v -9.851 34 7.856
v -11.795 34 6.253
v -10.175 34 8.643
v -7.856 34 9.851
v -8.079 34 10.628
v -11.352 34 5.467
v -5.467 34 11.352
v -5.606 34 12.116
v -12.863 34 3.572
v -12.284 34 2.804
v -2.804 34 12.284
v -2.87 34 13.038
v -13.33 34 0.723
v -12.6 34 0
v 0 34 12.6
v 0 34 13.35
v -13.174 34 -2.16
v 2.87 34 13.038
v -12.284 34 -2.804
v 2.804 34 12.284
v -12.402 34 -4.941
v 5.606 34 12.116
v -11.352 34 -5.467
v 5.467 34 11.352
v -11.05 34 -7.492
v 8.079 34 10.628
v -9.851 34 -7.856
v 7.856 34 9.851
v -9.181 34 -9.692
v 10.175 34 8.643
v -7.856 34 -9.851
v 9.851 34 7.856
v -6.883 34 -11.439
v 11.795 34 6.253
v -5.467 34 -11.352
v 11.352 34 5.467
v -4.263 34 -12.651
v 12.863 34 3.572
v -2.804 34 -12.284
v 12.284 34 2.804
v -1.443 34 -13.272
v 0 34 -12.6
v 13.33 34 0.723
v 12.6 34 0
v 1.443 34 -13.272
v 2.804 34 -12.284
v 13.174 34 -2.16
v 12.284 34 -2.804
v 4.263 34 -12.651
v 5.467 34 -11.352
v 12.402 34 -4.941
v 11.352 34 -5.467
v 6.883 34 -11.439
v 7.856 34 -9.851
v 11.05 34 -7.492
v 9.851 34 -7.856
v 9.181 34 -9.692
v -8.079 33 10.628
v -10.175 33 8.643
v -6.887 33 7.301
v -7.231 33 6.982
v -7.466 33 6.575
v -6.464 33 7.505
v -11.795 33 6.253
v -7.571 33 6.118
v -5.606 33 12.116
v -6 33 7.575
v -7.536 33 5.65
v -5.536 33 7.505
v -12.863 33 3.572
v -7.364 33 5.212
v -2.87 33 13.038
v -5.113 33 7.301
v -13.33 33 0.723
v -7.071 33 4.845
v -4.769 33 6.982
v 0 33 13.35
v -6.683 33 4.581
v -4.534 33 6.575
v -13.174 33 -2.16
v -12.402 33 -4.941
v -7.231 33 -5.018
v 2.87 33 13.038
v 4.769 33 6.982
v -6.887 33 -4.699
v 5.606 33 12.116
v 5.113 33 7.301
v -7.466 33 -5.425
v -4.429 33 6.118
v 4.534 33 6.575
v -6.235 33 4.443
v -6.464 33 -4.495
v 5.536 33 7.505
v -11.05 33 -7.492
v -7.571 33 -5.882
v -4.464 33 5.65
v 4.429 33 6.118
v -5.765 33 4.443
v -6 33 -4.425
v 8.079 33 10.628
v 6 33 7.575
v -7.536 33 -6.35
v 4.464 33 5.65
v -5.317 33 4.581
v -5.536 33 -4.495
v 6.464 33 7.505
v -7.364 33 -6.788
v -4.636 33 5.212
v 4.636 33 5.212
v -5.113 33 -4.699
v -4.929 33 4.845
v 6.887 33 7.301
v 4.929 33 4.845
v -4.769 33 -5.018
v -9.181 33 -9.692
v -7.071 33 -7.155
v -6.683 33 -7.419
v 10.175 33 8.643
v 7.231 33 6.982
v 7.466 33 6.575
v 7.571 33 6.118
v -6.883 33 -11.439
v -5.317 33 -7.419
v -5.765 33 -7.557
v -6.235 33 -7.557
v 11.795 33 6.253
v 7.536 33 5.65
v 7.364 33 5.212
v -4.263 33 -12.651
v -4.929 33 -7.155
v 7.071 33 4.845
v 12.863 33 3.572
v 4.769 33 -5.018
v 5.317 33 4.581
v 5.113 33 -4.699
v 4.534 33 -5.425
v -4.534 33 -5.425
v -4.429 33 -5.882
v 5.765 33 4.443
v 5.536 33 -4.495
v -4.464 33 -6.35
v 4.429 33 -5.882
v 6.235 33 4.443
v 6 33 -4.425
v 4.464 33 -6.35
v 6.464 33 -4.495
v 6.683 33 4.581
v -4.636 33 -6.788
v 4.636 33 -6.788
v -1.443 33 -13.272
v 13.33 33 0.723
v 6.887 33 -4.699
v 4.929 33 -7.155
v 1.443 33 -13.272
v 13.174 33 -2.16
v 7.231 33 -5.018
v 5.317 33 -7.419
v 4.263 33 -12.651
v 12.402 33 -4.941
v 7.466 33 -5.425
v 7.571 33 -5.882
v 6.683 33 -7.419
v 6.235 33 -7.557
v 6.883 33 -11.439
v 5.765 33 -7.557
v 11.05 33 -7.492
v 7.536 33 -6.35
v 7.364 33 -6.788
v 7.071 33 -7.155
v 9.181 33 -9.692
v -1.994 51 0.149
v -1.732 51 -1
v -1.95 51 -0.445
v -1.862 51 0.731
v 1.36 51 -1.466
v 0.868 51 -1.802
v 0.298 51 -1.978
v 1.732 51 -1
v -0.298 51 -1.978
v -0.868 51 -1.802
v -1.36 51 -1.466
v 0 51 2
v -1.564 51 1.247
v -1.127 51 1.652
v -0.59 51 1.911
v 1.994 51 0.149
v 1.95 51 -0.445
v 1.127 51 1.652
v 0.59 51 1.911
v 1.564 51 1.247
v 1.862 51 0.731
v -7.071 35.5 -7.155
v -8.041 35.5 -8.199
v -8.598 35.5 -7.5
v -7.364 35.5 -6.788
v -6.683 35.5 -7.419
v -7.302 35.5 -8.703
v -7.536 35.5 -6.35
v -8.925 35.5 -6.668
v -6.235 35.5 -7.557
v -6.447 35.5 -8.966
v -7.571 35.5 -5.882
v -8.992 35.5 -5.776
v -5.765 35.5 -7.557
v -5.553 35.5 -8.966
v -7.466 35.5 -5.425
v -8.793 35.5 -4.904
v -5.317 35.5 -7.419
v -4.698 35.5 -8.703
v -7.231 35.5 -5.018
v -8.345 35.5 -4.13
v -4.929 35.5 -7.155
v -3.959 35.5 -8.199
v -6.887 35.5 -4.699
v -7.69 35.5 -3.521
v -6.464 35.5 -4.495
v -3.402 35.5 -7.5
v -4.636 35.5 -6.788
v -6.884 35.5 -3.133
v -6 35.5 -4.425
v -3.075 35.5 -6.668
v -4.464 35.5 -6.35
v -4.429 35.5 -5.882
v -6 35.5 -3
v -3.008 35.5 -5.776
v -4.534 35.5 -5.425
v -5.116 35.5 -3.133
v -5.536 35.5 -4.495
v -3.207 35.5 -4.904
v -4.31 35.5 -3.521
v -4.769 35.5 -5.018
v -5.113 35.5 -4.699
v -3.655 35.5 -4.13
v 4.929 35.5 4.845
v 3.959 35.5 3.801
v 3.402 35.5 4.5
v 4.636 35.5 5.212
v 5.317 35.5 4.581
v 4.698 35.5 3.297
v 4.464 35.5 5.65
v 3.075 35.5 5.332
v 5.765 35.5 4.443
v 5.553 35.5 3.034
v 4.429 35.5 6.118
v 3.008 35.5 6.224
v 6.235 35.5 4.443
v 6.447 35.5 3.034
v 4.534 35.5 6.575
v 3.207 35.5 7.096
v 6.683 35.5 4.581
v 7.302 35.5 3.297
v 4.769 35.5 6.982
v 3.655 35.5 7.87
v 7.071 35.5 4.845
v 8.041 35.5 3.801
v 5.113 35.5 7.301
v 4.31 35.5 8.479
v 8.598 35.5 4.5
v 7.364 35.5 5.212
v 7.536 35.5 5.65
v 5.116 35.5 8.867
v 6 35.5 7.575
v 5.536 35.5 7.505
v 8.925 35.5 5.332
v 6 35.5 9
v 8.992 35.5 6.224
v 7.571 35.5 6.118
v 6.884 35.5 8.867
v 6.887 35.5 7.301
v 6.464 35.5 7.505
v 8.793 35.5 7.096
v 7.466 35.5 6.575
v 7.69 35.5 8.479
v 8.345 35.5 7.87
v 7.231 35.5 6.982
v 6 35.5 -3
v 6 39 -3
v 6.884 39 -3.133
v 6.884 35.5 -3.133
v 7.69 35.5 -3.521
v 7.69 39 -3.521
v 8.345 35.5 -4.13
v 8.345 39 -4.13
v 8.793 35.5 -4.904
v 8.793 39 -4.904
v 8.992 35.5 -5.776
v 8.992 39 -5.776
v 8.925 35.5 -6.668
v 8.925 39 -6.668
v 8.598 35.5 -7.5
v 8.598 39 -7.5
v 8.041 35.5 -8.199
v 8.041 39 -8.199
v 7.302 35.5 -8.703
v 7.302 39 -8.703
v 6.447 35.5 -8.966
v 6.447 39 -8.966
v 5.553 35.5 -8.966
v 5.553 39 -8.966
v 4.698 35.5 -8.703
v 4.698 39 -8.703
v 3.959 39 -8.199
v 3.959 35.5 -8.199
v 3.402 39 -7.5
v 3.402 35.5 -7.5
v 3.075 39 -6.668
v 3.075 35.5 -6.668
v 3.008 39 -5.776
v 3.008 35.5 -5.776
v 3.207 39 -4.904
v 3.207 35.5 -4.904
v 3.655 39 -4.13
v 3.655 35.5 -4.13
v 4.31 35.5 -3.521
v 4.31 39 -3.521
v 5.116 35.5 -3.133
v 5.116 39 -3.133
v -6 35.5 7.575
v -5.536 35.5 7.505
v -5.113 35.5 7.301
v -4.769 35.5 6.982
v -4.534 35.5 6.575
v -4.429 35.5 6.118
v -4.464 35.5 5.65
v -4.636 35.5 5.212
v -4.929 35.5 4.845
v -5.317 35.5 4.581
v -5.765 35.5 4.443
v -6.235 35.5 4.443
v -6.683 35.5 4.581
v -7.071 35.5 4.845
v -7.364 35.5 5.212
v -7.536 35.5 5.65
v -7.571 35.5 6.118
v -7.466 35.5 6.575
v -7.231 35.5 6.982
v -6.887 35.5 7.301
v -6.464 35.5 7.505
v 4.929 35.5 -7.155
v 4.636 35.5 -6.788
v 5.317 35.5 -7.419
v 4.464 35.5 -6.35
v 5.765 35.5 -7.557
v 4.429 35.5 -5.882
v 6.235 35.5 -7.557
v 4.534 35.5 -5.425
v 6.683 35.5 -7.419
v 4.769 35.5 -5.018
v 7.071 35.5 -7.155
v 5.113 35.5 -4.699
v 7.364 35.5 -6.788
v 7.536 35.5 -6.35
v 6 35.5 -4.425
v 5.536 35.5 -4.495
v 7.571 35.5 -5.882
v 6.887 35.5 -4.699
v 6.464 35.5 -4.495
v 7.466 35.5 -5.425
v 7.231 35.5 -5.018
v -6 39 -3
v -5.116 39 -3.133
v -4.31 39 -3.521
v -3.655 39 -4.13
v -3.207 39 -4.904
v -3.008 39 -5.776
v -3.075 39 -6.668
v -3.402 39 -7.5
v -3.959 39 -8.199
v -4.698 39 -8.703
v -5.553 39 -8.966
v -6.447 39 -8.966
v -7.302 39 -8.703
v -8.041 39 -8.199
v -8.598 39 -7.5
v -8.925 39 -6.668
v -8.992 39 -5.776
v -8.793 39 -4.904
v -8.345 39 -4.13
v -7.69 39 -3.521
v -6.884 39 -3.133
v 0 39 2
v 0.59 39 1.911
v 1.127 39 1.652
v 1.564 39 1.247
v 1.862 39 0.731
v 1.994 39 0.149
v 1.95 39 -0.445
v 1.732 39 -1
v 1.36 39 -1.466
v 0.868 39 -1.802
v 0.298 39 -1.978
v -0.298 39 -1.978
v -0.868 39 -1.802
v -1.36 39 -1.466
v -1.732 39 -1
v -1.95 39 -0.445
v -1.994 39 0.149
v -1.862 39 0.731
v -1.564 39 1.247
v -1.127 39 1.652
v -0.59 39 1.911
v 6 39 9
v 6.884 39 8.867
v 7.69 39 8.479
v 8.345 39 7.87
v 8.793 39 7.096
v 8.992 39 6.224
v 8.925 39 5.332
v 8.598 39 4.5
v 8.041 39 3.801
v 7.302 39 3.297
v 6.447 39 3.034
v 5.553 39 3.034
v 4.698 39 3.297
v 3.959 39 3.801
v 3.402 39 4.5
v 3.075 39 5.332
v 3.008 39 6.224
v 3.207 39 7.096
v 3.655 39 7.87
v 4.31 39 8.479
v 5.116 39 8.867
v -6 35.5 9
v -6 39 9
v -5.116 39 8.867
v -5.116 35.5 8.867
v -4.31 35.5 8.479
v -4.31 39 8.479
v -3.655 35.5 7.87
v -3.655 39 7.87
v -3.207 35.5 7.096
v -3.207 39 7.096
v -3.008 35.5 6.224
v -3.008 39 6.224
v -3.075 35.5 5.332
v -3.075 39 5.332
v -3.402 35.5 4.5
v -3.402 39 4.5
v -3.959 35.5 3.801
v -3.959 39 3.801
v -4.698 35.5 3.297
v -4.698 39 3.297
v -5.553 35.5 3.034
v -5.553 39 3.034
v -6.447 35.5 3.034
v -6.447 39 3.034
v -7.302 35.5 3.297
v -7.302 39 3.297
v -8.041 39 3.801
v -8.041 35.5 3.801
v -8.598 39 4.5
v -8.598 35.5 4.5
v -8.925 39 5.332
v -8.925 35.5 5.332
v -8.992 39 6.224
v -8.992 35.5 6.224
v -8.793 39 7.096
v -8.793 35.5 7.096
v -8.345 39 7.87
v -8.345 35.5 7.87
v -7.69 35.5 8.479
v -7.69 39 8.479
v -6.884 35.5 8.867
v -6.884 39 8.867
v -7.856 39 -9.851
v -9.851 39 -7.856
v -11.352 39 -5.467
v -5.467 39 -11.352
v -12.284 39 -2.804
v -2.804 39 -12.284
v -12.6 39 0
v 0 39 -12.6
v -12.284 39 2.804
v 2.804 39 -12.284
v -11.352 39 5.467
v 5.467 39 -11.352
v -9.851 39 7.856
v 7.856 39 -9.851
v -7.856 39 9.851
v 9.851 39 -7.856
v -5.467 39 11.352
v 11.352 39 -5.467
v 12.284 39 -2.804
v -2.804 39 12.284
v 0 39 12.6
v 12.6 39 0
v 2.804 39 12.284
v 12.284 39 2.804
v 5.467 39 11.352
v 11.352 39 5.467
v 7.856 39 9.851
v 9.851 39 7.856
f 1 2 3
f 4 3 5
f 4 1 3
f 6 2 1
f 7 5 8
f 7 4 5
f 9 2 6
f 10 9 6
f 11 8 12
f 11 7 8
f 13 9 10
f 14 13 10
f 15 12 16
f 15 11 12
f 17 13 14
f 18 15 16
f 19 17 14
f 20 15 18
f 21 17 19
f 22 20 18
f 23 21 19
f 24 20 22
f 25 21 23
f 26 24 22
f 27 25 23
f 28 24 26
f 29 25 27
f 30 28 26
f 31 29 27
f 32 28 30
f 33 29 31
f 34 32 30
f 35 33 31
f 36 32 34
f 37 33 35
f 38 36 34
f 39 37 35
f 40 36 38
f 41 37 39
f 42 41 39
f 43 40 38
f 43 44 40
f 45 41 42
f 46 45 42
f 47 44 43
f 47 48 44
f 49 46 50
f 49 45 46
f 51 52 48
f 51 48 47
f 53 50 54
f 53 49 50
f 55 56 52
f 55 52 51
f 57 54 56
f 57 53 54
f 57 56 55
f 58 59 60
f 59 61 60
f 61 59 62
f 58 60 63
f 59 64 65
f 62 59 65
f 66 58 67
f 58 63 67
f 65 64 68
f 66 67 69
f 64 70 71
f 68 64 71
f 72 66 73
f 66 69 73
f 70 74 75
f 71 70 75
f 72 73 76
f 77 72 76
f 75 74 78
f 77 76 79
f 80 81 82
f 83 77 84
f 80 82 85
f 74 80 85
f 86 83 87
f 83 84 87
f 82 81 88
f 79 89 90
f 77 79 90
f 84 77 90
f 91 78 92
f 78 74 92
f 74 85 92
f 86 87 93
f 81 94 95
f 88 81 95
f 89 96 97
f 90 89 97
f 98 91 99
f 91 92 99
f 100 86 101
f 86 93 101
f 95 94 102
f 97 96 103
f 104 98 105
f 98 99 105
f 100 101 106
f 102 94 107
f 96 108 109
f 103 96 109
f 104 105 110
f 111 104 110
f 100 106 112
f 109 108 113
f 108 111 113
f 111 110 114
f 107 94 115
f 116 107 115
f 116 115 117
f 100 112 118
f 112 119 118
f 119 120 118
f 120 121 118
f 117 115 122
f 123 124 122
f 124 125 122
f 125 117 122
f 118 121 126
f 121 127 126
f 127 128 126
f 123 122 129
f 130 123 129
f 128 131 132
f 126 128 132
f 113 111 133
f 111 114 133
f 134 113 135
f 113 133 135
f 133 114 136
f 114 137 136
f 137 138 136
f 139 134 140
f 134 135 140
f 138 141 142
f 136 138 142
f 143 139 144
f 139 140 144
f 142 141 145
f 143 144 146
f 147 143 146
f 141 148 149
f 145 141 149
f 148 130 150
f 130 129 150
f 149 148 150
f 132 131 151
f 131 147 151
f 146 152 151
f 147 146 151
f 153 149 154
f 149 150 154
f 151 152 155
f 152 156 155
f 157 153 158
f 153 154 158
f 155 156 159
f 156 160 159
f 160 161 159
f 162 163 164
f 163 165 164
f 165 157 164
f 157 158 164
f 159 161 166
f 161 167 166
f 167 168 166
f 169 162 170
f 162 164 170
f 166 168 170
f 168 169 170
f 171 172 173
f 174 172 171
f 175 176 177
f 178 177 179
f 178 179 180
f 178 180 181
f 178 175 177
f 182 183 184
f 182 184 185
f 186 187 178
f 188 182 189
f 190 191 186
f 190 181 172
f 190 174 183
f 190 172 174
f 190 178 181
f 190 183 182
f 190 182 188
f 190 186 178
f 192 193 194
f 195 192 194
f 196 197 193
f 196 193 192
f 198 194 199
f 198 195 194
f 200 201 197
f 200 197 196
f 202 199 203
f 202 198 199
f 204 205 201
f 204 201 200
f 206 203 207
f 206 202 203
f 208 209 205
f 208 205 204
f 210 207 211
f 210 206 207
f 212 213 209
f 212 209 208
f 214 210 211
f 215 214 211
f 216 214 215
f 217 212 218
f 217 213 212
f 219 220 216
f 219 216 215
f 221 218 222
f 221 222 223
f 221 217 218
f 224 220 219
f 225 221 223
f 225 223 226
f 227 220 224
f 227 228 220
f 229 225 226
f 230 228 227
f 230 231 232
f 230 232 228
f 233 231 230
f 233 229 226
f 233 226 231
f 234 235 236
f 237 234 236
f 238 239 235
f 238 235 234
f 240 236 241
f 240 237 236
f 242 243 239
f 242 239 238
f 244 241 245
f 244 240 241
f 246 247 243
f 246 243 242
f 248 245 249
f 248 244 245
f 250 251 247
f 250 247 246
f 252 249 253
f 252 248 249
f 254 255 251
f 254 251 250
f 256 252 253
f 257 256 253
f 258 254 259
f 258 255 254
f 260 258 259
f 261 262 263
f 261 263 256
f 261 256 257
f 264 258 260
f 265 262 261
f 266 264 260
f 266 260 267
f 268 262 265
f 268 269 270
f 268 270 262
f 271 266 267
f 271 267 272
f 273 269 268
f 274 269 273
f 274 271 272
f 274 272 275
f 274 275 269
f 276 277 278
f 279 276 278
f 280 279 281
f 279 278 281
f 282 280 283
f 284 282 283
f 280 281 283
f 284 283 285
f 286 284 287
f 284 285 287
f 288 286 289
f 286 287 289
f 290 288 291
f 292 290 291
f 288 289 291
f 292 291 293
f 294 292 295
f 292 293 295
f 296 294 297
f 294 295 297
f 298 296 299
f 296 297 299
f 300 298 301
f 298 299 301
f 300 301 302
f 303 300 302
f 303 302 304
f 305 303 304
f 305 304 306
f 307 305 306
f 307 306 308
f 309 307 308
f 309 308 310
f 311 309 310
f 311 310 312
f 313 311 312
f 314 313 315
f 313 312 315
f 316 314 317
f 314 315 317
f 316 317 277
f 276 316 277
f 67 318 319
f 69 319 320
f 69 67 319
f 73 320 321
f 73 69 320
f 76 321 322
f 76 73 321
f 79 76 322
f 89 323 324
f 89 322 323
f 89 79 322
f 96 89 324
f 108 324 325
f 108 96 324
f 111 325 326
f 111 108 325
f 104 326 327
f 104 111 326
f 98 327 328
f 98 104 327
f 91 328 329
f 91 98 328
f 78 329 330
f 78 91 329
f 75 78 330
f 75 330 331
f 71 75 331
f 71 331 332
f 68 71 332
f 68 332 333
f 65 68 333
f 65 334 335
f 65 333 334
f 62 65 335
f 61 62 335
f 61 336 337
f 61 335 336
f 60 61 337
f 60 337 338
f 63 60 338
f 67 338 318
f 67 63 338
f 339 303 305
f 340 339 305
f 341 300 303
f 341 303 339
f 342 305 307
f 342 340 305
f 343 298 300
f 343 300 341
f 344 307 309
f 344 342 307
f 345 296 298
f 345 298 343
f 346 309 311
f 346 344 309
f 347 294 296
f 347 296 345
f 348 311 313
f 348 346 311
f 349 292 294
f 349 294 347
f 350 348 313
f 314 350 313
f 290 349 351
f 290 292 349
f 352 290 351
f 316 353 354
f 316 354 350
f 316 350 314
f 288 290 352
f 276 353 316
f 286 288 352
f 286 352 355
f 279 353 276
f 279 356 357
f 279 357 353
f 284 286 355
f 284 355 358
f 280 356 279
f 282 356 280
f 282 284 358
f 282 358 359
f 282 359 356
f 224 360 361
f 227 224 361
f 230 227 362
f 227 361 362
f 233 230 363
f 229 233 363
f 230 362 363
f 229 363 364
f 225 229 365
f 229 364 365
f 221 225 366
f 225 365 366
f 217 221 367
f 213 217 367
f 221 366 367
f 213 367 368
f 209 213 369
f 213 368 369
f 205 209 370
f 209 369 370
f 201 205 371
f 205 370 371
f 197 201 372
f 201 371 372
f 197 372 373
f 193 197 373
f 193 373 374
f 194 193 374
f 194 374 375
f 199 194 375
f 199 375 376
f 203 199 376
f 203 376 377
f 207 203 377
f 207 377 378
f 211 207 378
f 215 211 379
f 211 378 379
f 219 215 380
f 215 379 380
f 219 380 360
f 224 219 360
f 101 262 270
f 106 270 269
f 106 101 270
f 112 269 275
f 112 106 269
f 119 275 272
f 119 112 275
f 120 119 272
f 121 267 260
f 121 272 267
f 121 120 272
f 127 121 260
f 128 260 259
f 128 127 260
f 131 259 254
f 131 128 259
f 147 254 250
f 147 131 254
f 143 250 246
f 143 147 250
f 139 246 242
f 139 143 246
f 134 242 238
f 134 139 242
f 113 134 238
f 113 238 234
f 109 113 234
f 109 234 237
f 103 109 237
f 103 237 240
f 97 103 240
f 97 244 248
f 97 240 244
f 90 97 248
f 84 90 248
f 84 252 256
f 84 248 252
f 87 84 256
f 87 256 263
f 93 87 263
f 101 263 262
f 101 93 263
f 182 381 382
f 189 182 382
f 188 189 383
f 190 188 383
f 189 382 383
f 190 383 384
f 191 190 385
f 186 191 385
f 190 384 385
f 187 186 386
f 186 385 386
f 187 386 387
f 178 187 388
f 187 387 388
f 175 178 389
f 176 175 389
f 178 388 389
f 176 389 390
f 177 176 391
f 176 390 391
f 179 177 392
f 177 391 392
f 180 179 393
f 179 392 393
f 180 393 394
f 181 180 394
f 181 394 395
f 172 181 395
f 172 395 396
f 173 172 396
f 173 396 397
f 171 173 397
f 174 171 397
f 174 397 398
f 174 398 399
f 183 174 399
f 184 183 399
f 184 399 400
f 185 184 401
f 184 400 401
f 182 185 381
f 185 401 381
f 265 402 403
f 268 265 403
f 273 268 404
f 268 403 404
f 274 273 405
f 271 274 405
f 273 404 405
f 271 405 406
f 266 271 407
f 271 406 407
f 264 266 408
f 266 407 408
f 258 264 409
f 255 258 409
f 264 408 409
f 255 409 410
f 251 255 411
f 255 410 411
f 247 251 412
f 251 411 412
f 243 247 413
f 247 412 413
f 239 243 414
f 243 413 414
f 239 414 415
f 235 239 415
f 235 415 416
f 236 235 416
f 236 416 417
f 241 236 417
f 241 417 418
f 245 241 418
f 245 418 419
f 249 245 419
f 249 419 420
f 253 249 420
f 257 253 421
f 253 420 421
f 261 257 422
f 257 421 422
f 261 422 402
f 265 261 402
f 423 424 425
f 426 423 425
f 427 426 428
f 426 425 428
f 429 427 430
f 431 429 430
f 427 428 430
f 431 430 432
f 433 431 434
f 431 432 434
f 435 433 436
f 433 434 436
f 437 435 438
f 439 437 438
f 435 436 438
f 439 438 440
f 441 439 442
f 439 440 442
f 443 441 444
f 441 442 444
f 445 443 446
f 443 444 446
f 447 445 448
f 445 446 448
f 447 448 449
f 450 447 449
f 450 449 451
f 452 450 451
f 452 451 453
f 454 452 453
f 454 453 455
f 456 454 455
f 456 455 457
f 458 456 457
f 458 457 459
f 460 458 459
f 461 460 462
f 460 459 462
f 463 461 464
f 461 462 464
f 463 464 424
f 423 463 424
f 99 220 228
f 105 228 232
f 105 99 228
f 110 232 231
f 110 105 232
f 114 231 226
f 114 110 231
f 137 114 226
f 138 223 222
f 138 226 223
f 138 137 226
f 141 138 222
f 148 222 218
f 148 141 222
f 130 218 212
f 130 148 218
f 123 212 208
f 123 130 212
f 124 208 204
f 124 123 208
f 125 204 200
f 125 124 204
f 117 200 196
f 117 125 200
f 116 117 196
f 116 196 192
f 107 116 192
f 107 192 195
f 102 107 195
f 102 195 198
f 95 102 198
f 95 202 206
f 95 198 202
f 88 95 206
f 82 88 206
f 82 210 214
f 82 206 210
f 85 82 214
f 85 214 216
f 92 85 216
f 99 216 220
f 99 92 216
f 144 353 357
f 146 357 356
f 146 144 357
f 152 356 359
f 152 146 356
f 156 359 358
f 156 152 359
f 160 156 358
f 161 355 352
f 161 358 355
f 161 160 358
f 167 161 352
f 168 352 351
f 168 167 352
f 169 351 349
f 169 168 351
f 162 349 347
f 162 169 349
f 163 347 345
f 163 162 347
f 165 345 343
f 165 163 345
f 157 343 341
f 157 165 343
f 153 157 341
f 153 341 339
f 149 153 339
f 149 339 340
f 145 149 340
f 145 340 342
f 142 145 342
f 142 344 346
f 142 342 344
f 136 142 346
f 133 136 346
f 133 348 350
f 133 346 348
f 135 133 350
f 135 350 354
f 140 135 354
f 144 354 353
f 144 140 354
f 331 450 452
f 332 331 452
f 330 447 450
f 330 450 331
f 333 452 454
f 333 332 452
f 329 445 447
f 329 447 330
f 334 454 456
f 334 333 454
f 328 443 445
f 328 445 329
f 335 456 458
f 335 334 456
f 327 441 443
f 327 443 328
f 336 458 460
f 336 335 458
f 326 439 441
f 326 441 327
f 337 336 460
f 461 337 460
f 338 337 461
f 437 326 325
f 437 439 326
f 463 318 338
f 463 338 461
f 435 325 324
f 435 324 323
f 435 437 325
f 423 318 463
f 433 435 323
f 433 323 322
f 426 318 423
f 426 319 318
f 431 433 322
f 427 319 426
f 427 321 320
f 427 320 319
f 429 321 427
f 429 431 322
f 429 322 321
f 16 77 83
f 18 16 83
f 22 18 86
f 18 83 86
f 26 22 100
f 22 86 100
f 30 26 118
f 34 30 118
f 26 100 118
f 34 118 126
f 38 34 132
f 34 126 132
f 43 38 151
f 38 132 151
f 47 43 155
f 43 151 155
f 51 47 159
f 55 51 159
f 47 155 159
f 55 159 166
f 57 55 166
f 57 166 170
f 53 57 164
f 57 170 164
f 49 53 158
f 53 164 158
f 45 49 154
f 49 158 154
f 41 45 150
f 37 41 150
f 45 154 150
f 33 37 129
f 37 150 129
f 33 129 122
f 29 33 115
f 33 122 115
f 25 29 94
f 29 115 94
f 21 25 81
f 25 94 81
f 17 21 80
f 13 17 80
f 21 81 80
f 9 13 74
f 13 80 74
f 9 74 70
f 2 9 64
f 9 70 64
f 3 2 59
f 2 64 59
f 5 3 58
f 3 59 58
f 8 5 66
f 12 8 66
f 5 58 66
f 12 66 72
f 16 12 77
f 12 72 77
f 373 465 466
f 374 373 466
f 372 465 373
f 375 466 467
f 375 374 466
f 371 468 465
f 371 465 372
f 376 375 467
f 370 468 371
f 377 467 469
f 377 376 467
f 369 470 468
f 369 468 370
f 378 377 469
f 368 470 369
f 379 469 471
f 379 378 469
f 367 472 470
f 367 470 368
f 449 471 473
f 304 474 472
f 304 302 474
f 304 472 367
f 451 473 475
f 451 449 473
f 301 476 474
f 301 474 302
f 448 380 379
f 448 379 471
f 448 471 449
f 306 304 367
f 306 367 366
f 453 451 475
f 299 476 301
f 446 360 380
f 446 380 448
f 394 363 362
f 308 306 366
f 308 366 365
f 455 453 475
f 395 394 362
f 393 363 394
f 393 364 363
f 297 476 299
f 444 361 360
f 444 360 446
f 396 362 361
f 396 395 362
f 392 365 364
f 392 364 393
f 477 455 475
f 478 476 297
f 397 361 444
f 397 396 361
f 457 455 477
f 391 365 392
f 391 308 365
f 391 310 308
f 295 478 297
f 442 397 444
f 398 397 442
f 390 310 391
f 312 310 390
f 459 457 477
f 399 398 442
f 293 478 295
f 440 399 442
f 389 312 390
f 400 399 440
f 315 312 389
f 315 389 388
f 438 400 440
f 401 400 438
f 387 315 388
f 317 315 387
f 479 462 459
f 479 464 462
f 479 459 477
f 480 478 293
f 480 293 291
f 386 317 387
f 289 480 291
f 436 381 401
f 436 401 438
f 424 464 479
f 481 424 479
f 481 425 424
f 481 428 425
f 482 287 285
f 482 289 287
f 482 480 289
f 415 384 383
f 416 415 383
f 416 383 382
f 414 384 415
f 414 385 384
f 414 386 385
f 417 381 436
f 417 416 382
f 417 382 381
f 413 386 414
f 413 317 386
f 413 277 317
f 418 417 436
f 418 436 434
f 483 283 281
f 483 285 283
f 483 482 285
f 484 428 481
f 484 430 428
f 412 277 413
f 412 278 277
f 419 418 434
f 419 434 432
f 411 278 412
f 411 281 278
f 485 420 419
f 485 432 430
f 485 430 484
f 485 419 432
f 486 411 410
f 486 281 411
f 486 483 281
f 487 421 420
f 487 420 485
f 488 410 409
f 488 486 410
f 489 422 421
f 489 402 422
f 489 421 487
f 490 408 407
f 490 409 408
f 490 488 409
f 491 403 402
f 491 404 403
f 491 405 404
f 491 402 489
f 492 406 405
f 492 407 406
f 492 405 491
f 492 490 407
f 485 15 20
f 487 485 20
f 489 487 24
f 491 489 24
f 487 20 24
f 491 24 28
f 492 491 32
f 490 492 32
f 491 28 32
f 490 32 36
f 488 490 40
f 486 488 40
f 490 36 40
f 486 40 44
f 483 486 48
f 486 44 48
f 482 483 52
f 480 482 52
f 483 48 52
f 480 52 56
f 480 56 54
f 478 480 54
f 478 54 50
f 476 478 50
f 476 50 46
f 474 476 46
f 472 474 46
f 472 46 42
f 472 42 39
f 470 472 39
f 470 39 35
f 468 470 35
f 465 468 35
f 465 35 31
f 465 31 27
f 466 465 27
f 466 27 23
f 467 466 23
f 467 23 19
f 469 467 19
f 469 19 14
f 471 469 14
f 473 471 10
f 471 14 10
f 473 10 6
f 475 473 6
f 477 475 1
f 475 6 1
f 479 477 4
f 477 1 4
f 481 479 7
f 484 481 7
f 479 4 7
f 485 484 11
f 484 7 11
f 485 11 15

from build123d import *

# Parameters (mm, degrees)
SKETCH1_R           = 13.35
SKETCH1_R_2         = 1.575
BOSS_EXTRUDE1_DEPTH = 1
SKETCH1_3_R         = 12.6
SKETCH1_3_R_2       = 1.575
BOSS_EXTRUDE2_DEPTH = 6
SKETCH2_R           = 3
CUT_EXTRUDE1_DEPTH  = 3.5
SKETCH3_R           = 2
BOSS_EXTRUDE3_DEPTH = 12


with BuildPart() as part:
    # Sketch1 → Boss-Extrude1 (new body)
    with BuildSketch(Plane(origin=(0, 33, 0), x_dir=(1, 0, 0), z_dir=(0, 1, 0))):
        Circle(SKETCH1_R)
        with Locations((-6, -6)):
            Circle(SKETCH1_R_2, mode=Mode.SUBTRACT)
        with Locations((6, -6)):
            Circle(SKETCH1_R_2, mode=Mode.SUBTRACT)
        with Locations((-6, 6)):
            Circle(SKETCH1_R_2, mode=Mode.SUBTRACT)
        with Locations((6, 6)):
            Circle(SKETCH1_R_2, mode=Mode.SUBTRACT)
    extrude(amount=BOSS_EXTRUDE1_DEPTH)

    # Sketch1<3> → Boss-Extrude2 (add)
    with BuildSketch(Plane(origin=(0, 33, 0), x_dir=(1, 0, 0), z_dir=(0, 1, 0))):
        Circle(SKETCH1_3_R)
        with Locations((-6, -6)):
            Circle(SKETCH1_3_R_2, mode=Mode.SUBTRACT)
        with Locations((6, -6)):
            Circle(SKETCH1_3_R_2, mode=Mode.SUBTRACT)
        with Locations((-6, 6)):
            Circle(SKETCH1_3_R_2, mode=Mode.SUBTRACT)
        with Locations((6, 6)):
            Circle(SKETCH1_3_R_2, mode=Mode.SUBTRACT)
    extrude(amount=BOSS_EXTRUDE2_DEPTH)

    # Sketch2 → Cut-Extrude1 (cut)
    with BuildSketch(Plane(origin=(0, 39, 0), x_dir=(1, 0, 0), z_dir=(0, 1, 0))):
        with Locations((-6, 6)):
            Circle(SKETCH2_R)
        with Locations((6, 6)):
            Circle(SKETCH2_R)
        with Locations((6, -6)):
            Circle(SKETCH2_R)
        with Locations((-6, -6)):
            Circle(SKETCH2_R)
    extrude(amount=-CUT_EXTRUDE1_DEPTH, mode=Mode.SUBTRACT)

    # Sketch3 → Boss-Extrude3 (add)
    with BuildSketch(Plane(origin=(0, 39, 0), x_dir=(1, 0, 0), z_dir=(0, 1, 0))):
        Circle(SKETCH3_R)
    extrude(amount=BOSS_EXTRUDE3_DEPTH)


solid = part.part
